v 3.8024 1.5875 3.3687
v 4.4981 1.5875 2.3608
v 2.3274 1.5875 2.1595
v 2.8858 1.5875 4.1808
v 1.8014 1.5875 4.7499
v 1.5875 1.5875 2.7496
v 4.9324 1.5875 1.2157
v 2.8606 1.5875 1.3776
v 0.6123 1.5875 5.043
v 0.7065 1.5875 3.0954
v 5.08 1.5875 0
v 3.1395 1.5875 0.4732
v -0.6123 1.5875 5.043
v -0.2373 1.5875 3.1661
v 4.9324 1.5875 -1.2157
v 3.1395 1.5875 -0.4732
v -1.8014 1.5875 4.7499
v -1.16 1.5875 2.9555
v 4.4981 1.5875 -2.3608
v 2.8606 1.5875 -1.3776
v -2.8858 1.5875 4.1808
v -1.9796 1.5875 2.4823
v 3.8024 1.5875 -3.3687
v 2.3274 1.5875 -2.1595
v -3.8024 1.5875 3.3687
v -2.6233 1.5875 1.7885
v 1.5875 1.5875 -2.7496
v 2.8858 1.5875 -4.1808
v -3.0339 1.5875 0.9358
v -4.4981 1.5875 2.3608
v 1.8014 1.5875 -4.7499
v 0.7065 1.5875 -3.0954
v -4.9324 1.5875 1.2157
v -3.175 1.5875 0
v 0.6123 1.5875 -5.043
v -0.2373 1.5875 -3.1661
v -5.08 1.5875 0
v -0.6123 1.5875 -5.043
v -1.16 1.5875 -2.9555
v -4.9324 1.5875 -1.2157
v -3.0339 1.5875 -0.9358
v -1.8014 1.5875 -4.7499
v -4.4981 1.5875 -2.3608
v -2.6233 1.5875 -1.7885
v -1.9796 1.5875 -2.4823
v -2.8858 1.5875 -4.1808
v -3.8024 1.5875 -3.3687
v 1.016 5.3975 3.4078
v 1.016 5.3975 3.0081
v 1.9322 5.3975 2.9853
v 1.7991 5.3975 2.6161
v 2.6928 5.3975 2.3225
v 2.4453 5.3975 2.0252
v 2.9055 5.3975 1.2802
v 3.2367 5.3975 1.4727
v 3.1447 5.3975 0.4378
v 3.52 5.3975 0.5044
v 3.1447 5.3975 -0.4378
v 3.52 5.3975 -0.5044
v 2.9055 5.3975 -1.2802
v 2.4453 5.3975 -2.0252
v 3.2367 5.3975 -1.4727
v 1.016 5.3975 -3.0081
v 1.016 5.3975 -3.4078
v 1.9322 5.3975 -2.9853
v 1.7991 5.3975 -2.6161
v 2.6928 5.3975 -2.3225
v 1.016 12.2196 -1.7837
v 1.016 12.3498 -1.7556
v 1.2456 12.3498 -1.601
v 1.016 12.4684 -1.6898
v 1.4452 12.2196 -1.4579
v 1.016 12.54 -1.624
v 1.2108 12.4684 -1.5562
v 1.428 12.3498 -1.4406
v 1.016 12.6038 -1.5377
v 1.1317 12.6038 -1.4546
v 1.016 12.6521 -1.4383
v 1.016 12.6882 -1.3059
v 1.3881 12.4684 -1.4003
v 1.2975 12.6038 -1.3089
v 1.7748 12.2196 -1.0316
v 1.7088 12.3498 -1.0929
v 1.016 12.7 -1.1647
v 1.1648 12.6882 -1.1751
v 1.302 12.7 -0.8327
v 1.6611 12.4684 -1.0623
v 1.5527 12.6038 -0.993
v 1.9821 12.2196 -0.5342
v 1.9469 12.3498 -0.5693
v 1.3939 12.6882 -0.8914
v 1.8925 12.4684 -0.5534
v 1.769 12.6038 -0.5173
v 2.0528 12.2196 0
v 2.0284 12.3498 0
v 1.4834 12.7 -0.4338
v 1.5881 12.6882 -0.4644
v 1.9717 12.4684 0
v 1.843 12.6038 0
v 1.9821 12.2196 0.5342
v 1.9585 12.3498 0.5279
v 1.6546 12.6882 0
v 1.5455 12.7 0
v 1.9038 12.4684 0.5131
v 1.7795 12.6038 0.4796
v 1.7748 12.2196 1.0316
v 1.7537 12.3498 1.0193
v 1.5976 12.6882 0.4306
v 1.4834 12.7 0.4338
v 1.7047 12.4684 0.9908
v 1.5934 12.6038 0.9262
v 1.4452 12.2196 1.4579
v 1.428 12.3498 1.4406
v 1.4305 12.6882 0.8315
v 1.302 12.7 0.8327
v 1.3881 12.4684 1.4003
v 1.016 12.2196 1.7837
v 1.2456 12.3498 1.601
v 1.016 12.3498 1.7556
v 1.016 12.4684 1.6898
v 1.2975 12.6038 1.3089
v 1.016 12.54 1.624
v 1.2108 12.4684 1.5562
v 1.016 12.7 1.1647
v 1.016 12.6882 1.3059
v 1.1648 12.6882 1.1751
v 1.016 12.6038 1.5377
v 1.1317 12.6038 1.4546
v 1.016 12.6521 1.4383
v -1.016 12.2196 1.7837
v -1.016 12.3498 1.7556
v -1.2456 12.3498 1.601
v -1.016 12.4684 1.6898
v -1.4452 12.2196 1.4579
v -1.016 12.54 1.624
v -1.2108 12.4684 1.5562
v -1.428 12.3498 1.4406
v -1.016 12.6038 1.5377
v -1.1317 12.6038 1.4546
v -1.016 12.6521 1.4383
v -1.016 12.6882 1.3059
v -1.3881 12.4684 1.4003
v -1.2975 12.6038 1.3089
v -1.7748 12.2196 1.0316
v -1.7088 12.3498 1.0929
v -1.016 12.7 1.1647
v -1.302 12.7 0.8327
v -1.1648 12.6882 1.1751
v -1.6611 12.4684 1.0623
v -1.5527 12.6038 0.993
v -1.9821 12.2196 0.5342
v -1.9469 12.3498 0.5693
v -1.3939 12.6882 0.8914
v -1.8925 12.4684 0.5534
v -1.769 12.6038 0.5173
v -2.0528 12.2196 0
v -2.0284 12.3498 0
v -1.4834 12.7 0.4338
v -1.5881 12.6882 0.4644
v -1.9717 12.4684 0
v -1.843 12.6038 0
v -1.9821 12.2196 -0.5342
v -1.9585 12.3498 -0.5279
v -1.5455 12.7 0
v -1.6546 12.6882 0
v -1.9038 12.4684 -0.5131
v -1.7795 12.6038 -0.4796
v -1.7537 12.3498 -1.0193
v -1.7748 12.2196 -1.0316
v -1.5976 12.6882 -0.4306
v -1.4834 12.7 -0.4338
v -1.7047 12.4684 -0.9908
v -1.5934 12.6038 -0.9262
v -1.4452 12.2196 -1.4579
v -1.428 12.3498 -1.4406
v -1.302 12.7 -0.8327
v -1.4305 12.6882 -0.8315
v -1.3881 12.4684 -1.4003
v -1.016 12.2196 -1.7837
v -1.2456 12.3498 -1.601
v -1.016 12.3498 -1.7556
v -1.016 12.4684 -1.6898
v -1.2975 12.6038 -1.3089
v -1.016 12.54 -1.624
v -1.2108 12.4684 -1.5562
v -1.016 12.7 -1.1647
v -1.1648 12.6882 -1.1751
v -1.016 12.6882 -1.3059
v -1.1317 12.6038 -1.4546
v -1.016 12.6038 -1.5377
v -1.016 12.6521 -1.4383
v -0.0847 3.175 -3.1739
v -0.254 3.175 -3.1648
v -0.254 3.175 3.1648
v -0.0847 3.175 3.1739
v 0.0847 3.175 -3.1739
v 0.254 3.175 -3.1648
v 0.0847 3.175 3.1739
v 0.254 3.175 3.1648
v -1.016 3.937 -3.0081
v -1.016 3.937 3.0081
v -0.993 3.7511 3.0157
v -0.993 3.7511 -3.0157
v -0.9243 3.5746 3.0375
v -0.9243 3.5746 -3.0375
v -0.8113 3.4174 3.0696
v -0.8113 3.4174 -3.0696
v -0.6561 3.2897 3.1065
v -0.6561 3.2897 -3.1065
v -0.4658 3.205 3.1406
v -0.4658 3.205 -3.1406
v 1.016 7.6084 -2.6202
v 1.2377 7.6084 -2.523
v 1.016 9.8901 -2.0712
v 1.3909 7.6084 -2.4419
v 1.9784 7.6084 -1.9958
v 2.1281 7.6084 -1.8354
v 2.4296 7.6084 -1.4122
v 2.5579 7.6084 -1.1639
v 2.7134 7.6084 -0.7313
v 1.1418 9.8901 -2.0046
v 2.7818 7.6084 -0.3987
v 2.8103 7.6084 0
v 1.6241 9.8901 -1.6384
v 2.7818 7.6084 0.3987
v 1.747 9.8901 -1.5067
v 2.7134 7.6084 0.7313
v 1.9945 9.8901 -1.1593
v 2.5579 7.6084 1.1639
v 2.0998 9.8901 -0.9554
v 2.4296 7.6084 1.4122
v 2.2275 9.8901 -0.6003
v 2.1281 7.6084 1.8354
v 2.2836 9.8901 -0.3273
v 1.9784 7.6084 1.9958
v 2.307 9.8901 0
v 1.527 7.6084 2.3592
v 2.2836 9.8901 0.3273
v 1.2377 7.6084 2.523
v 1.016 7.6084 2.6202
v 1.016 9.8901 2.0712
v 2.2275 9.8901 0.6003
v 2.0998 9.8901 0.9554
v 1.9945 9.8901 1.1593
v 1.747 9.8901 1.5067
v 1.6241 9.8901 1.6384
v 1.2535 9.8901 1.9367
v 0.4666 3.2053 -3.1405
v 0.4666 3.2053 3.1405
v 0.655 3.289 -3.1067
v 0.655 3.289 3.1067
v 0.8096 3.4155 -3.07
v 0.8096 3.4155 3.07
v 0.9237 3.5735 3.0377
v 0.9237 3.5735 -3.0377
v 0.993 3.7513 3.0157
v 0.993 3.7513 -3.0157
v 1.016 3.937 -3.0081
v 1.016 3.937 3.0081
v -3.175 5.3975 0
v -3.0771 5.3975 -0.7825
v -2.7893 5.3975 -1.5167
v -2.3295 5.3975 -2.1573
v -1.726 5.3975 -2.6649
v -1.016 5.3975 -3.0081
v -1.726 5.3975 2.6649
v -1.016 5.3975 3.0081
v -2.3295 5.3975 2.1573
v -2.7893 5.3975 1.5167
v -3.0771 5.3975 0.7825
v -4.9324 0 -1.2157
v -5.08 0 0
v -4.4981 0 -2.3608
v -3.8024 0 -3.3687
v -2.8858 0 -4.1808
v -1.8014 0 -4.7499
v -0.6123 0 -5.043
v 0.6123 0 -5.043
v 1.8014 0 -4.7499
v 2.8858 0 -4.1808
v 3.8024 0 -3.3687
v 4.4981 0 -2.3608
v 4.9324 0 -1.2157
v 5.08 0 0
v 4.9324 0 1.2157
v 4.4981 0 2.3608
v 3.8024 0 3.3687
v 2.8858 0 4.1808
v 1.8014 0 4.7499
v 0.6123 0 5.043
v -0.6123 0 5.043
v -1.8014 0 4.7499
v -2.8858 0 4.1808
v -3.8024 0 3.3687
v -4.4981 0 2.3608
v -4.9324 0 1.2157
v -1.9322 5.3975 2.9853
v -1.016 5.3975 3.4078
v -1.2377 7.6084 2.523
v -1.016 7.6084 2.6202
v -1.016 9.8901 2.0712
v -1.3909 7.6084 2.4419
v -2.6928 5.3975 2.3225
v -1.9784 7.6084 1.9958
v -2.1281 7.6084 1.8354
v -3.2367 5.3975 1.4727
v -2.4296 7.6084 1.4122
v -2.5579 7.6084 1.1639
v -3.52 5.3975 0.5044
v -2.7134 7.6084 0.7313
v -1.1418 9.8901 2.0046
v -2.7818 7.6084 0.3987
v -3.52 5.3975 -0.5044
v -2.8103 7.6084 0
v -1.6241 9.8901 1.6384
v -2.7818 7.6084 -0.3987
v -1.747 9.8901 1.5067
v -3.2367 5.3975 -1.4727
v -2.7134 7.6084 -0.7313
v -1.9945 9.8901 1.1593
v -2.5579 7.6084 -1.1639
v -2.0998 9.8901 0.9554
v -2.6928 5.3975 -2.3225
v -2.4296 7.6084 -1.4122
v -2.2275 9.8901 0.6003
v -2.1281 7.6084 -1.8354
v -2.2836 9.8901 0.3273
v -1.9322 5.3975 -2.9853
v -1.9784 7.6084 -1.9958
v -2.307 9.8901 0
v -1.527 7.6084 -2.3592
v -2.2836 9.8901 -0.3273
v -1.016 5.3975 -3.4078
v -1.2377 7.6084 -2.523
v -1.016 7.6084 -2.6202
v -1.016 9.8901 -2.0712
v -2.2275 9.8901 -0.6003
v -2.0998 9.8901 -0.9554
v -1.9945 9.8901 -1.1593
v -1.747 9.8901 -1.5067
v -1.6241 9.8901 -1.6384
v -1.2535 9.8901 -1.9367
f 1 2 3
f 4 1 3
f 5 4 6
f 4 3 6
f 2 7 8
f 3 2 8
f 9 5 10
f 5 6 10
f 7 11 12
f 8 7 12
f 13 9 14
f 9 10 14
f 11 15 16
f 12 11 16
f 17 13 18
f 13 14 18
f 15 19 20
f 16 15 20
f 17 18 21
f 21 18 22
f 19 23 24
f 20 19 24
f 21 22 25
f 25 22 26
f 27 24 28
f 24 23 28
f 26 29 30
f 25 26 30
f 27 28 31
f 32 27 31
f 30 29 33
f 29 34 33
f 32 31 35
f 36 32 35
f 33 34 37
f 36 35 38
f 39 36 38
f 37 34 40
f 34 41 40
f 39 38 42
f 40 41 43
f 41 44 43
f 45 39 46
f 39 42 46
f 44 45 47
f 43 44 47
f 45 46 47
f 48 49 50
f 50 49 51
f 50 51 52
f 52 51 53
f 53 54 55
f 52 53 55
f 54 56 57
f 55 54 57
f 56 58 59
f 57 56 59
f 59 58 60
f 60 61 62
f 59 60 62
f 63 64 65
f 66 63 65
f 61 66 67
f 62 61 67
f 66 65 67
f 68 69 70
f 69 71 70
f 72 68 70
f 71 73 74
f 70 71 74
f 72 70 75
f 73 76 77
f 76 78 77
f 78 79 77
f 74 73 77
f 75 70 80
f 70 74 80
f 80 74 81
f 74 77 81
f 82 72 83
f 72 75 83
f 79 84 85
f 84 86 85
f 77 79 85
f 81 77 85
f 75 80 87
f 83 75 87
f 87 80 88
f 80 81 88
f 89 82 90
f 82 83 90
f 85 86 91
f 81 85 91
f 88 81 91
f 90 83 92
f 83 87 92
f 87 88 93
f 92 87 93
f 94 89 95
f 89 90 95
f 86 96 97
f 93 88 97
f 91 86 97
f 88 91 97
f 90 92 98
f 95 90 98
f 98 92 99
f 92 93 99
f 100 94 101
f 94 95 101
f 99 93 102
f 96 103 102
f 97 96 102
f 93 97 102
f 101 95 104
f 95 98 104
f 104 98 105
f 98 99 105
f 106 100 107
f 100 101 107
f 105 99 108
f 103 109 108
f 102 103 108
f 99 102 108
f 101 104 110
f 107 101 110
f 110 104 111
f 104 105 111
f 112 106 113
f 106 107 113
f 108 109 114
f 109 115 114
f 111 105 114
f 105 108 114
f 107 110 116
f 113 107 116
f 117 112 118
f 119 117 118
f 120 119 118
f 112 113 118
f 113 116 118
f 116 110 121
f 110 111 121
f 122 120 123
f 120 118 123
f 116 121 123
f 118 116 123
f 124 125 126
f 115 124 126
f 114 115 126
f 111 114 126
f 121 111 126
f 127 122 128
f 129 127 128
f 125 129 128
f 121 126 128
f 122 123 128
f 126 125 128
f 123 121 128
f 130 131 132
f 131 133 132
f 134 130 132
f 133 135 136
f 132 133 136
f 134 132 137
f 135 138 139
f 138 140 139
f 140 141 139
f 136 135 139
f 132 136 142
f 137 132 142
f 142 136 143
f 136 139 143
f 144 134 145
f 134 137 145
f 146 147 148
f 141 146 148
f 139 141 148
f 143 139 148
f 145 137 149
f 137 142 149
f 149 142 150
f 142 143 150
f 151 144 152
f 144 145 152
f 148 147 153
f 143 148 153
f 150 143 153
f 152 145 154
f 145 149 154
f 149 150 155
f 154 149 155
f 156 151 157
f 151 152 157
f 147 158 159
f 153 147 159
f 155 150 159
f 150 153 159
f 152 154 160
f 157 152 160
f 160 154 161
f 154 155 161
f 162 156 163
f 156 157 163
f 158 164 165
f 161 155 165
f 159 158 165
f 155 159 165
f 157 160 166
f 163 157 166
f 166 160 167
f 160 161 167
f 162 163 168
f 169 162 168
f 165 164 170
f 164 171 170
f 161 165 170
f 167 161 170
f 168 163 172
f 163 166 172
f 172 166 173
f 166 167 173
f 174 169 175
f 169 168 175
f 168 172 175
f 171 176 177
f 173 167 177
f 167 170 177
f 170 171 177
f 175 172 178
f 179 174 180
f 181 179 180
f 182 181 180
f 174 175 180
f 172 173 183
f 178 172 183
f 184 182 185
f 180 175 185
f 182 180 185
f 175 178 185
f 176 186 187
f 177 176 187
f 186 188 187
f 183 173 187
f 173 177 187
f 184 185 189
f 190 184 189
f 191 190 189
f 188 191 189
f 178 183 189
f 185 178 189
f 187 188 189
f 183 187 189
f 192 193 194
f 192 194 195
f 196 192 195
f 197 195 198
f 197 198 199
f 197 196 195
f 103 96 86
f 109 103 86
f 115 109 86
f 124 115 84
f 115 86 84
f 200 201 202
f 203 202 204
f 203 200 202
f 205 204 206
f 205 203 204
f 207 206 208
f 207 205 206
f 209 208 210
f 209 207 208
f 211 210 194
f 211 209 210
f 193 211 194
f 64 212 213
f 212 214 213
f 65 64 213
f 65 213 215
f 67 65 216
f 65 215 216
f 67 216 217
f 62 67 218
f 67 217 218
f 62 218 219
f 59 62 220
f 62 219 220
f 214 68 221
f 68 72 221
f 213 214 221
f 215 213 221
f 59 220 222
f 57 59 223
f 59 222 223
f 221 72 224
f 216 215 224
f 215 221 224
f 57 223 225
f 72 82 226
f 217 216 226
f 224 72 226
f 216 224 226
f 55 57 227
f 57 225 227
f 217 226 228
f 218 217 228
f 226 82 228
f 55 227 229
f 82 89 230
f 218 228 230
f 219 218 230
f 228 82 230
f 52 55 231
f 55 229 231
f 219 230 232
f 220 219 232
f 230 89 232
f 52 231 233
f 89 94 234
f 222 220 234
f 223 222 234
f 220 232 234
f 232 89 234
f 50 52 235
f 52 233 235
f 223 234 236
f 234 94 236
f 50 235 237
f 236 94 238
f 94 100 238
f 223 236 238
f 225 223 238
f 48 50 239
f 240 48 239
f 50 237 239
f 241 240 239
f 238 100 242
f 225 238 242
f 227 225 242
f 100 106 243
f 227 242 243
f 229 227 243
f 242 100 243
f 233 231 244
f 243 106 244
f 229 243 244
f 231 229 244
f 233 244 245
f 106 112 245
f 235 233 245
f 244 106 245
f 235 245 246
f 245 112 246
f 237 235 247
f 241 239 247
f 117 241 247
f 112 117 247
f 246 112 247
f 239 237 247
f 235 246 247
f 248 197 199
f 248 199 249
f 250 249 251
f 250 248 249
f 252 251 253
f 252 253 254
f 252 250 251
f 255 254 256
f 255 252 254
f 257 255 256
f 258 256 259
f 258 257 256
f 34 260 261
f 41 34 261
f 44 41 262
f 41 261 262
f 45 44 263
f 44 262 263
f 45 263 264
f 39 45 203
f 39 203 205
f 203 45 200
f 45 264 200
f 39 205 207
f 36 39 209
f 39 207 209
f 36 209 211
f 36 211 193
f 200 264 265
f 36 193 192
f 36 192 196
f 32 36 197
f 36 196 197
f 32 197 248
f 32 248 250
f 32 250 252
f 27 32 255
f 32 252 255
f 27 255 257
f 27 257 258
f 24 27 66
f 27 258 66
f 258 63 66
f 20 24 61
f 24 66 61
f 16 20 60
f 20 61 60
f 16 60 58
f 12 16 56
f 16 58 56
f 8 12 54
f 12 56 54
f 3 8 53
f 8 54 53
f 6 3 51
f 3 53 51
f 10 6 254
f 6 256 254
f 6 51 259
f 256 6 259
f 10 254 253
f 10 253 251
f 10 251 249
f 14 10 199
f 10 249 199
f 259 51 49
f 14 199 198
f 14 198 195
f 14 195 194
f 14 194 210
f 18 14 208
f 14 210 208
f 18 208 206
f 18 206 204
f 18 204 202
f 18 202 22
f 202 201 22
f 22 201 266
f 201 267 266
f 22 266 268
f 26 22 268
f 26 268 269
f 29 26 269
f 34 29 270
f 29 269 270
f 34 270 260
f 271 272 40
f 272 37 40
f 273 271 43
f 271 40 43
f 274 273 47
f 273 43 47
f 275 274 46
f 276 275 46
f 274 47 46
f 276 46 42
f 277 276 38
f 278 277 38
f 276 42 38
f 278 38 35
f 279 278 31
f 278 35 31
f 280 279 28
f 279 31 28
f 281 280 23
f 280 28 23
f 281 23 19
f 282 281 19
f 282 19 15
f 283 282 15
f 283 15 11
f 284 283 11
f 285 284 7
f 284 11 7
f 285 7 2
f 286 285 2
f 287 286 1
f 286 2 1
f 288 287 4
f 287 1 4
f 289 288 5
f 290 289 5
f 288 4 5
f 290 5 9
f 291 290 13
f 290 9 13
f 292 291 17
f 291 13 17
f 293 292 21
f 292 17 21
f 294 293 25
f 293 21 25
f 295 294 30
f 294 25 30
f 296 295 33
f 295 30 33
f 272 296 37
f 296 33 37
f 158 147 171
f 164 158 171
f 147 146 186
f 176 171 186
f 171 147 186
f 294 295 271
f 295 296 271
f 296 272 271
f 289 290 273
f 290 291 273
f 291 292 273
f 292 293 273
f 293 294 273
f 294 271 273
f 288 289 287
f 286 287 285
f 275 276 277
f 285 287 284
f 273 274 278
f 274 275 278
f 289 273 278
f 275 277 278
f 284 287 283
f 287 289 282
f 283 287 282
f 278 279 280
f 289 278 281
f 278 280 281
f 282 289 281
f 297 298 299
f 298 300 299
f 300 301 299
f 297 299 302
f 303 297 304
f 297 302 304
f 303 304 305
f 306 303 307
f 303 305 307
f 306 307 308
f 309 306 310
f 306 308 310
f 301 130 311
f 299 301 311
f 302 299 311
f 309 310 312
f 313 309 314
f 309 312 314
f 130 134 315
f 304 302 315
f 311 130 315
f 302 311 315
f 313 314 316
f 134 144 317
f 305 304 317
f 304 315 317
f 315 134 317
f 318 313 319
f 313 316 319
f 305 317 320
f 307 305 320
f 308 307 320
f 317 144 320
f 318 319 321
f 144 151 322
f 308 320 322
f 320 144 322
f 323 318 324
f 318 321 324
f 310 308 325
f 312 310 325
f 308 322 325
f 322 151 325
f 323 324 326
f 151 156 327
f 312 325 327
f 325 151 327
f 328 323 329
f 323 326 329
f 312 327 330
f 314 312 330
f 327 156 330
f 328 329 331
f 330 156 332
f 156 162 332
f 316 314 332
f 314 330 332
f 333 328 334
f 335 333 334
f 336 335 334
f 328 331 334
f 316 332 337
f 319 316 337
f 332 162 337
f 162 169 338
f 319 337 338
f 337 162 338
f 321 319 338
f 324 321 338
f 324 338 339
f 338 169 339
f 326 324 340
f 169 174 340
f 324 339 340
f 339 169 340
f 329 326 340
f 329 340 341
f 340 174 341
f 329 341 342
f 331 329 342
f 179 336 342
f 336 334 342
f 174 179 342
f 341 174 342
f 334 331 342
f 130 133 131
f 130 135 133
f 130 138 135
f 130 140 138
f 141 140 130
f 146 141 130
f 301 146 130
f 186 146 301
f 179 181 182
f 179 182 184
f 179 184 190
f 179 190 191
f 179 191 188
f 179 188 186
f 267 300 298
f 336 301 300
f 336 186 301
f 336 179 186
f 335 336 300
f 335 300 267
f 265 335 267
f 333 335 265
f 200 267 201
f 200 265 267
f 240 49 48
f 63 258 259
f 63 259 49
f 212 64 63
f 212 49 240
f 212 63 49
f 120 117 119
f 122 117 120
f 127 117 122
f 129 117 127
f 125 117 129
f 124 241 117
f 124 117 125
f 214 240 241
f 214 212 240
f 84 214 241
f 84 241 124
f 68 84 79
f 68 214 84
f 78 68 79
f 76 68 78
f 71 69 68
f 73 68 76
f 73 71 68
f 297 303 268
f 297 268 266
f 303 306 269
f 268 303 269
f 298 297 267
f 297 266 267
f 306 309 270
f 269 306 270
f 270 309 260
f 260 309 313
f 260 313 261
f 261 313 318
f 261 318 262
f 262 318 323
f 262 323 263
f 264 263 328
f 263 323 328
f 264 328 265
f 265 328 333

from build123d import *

# Parameters (mm, degrees)
CUT_EXTRUDE1_DEPTH      = 15.591189122
CUT_EXTRUDE1_DEPTH_BACK = 15.591189122


with BuildPart() as part:
    # Sketch1 → Revolve1 (revolve)
    with BuildSketch(Plane.XY):
        with BuildLine():
            Line((0, 0), (-5.08, 0))
            Line((-5.08, 0), (-5.08, 1.5875))
            Line((-5.08, 1.5875), (-3.175, 1.5875))
            Line((-3.175, 1.5875), (-3.175, 5.3975))
            Line((-3.175, 5.3975), (-3.556, 5.3975))
            ThreePointArc((-3.556, 5.3975), (-2.52664009, 8.747354796), (-2.052787845, 12.219612423))
            ThreePointArc((-2.052787845, 12.219612423), (-1.894850225, 12.560843538), (-1.545538839, 12.7))
            Line((-1.545538839, 12.7), (0, 12.7))
            Line((0, 12.7), (0, 0))
        make_face()
    revolve(axis=Axis((0, 12.7, 0), (0, -1, 0)))

    # Sketch2 → Cut-Extrude1 (cut, two sides: drawn at the far end of the back side and taken through both)
    with BuildSketch(Plane.XY.offset(-CUT_EXTRUDE1_DEPTH_BACK)):
        with BuildLine():
            Line((-0.254, 3.175), (0.254, 3.175))
            ThreePointArc((0.254, 3.175), (0.792815367, 3.398184633), (1.016, 3.937))
            Line((1.016, 3.937), (1.016, 12.7))
            Line((1.016, 12.7), (-1.016, 12.7))
            Line((-1.016, 12.7), (-1.016, 3.937))
            ThreePointArc((-1.016, 3.937), (-0.792815367, 3.398184633), (-0.254, 3.175))
        make_face()
    extrude(amount=CUT_EXTRUDE1_DEPTH + CUT_EXTRUDE1_DEPTH_BACK, mode=Mode.SUBTRACT)


solid = part.part
